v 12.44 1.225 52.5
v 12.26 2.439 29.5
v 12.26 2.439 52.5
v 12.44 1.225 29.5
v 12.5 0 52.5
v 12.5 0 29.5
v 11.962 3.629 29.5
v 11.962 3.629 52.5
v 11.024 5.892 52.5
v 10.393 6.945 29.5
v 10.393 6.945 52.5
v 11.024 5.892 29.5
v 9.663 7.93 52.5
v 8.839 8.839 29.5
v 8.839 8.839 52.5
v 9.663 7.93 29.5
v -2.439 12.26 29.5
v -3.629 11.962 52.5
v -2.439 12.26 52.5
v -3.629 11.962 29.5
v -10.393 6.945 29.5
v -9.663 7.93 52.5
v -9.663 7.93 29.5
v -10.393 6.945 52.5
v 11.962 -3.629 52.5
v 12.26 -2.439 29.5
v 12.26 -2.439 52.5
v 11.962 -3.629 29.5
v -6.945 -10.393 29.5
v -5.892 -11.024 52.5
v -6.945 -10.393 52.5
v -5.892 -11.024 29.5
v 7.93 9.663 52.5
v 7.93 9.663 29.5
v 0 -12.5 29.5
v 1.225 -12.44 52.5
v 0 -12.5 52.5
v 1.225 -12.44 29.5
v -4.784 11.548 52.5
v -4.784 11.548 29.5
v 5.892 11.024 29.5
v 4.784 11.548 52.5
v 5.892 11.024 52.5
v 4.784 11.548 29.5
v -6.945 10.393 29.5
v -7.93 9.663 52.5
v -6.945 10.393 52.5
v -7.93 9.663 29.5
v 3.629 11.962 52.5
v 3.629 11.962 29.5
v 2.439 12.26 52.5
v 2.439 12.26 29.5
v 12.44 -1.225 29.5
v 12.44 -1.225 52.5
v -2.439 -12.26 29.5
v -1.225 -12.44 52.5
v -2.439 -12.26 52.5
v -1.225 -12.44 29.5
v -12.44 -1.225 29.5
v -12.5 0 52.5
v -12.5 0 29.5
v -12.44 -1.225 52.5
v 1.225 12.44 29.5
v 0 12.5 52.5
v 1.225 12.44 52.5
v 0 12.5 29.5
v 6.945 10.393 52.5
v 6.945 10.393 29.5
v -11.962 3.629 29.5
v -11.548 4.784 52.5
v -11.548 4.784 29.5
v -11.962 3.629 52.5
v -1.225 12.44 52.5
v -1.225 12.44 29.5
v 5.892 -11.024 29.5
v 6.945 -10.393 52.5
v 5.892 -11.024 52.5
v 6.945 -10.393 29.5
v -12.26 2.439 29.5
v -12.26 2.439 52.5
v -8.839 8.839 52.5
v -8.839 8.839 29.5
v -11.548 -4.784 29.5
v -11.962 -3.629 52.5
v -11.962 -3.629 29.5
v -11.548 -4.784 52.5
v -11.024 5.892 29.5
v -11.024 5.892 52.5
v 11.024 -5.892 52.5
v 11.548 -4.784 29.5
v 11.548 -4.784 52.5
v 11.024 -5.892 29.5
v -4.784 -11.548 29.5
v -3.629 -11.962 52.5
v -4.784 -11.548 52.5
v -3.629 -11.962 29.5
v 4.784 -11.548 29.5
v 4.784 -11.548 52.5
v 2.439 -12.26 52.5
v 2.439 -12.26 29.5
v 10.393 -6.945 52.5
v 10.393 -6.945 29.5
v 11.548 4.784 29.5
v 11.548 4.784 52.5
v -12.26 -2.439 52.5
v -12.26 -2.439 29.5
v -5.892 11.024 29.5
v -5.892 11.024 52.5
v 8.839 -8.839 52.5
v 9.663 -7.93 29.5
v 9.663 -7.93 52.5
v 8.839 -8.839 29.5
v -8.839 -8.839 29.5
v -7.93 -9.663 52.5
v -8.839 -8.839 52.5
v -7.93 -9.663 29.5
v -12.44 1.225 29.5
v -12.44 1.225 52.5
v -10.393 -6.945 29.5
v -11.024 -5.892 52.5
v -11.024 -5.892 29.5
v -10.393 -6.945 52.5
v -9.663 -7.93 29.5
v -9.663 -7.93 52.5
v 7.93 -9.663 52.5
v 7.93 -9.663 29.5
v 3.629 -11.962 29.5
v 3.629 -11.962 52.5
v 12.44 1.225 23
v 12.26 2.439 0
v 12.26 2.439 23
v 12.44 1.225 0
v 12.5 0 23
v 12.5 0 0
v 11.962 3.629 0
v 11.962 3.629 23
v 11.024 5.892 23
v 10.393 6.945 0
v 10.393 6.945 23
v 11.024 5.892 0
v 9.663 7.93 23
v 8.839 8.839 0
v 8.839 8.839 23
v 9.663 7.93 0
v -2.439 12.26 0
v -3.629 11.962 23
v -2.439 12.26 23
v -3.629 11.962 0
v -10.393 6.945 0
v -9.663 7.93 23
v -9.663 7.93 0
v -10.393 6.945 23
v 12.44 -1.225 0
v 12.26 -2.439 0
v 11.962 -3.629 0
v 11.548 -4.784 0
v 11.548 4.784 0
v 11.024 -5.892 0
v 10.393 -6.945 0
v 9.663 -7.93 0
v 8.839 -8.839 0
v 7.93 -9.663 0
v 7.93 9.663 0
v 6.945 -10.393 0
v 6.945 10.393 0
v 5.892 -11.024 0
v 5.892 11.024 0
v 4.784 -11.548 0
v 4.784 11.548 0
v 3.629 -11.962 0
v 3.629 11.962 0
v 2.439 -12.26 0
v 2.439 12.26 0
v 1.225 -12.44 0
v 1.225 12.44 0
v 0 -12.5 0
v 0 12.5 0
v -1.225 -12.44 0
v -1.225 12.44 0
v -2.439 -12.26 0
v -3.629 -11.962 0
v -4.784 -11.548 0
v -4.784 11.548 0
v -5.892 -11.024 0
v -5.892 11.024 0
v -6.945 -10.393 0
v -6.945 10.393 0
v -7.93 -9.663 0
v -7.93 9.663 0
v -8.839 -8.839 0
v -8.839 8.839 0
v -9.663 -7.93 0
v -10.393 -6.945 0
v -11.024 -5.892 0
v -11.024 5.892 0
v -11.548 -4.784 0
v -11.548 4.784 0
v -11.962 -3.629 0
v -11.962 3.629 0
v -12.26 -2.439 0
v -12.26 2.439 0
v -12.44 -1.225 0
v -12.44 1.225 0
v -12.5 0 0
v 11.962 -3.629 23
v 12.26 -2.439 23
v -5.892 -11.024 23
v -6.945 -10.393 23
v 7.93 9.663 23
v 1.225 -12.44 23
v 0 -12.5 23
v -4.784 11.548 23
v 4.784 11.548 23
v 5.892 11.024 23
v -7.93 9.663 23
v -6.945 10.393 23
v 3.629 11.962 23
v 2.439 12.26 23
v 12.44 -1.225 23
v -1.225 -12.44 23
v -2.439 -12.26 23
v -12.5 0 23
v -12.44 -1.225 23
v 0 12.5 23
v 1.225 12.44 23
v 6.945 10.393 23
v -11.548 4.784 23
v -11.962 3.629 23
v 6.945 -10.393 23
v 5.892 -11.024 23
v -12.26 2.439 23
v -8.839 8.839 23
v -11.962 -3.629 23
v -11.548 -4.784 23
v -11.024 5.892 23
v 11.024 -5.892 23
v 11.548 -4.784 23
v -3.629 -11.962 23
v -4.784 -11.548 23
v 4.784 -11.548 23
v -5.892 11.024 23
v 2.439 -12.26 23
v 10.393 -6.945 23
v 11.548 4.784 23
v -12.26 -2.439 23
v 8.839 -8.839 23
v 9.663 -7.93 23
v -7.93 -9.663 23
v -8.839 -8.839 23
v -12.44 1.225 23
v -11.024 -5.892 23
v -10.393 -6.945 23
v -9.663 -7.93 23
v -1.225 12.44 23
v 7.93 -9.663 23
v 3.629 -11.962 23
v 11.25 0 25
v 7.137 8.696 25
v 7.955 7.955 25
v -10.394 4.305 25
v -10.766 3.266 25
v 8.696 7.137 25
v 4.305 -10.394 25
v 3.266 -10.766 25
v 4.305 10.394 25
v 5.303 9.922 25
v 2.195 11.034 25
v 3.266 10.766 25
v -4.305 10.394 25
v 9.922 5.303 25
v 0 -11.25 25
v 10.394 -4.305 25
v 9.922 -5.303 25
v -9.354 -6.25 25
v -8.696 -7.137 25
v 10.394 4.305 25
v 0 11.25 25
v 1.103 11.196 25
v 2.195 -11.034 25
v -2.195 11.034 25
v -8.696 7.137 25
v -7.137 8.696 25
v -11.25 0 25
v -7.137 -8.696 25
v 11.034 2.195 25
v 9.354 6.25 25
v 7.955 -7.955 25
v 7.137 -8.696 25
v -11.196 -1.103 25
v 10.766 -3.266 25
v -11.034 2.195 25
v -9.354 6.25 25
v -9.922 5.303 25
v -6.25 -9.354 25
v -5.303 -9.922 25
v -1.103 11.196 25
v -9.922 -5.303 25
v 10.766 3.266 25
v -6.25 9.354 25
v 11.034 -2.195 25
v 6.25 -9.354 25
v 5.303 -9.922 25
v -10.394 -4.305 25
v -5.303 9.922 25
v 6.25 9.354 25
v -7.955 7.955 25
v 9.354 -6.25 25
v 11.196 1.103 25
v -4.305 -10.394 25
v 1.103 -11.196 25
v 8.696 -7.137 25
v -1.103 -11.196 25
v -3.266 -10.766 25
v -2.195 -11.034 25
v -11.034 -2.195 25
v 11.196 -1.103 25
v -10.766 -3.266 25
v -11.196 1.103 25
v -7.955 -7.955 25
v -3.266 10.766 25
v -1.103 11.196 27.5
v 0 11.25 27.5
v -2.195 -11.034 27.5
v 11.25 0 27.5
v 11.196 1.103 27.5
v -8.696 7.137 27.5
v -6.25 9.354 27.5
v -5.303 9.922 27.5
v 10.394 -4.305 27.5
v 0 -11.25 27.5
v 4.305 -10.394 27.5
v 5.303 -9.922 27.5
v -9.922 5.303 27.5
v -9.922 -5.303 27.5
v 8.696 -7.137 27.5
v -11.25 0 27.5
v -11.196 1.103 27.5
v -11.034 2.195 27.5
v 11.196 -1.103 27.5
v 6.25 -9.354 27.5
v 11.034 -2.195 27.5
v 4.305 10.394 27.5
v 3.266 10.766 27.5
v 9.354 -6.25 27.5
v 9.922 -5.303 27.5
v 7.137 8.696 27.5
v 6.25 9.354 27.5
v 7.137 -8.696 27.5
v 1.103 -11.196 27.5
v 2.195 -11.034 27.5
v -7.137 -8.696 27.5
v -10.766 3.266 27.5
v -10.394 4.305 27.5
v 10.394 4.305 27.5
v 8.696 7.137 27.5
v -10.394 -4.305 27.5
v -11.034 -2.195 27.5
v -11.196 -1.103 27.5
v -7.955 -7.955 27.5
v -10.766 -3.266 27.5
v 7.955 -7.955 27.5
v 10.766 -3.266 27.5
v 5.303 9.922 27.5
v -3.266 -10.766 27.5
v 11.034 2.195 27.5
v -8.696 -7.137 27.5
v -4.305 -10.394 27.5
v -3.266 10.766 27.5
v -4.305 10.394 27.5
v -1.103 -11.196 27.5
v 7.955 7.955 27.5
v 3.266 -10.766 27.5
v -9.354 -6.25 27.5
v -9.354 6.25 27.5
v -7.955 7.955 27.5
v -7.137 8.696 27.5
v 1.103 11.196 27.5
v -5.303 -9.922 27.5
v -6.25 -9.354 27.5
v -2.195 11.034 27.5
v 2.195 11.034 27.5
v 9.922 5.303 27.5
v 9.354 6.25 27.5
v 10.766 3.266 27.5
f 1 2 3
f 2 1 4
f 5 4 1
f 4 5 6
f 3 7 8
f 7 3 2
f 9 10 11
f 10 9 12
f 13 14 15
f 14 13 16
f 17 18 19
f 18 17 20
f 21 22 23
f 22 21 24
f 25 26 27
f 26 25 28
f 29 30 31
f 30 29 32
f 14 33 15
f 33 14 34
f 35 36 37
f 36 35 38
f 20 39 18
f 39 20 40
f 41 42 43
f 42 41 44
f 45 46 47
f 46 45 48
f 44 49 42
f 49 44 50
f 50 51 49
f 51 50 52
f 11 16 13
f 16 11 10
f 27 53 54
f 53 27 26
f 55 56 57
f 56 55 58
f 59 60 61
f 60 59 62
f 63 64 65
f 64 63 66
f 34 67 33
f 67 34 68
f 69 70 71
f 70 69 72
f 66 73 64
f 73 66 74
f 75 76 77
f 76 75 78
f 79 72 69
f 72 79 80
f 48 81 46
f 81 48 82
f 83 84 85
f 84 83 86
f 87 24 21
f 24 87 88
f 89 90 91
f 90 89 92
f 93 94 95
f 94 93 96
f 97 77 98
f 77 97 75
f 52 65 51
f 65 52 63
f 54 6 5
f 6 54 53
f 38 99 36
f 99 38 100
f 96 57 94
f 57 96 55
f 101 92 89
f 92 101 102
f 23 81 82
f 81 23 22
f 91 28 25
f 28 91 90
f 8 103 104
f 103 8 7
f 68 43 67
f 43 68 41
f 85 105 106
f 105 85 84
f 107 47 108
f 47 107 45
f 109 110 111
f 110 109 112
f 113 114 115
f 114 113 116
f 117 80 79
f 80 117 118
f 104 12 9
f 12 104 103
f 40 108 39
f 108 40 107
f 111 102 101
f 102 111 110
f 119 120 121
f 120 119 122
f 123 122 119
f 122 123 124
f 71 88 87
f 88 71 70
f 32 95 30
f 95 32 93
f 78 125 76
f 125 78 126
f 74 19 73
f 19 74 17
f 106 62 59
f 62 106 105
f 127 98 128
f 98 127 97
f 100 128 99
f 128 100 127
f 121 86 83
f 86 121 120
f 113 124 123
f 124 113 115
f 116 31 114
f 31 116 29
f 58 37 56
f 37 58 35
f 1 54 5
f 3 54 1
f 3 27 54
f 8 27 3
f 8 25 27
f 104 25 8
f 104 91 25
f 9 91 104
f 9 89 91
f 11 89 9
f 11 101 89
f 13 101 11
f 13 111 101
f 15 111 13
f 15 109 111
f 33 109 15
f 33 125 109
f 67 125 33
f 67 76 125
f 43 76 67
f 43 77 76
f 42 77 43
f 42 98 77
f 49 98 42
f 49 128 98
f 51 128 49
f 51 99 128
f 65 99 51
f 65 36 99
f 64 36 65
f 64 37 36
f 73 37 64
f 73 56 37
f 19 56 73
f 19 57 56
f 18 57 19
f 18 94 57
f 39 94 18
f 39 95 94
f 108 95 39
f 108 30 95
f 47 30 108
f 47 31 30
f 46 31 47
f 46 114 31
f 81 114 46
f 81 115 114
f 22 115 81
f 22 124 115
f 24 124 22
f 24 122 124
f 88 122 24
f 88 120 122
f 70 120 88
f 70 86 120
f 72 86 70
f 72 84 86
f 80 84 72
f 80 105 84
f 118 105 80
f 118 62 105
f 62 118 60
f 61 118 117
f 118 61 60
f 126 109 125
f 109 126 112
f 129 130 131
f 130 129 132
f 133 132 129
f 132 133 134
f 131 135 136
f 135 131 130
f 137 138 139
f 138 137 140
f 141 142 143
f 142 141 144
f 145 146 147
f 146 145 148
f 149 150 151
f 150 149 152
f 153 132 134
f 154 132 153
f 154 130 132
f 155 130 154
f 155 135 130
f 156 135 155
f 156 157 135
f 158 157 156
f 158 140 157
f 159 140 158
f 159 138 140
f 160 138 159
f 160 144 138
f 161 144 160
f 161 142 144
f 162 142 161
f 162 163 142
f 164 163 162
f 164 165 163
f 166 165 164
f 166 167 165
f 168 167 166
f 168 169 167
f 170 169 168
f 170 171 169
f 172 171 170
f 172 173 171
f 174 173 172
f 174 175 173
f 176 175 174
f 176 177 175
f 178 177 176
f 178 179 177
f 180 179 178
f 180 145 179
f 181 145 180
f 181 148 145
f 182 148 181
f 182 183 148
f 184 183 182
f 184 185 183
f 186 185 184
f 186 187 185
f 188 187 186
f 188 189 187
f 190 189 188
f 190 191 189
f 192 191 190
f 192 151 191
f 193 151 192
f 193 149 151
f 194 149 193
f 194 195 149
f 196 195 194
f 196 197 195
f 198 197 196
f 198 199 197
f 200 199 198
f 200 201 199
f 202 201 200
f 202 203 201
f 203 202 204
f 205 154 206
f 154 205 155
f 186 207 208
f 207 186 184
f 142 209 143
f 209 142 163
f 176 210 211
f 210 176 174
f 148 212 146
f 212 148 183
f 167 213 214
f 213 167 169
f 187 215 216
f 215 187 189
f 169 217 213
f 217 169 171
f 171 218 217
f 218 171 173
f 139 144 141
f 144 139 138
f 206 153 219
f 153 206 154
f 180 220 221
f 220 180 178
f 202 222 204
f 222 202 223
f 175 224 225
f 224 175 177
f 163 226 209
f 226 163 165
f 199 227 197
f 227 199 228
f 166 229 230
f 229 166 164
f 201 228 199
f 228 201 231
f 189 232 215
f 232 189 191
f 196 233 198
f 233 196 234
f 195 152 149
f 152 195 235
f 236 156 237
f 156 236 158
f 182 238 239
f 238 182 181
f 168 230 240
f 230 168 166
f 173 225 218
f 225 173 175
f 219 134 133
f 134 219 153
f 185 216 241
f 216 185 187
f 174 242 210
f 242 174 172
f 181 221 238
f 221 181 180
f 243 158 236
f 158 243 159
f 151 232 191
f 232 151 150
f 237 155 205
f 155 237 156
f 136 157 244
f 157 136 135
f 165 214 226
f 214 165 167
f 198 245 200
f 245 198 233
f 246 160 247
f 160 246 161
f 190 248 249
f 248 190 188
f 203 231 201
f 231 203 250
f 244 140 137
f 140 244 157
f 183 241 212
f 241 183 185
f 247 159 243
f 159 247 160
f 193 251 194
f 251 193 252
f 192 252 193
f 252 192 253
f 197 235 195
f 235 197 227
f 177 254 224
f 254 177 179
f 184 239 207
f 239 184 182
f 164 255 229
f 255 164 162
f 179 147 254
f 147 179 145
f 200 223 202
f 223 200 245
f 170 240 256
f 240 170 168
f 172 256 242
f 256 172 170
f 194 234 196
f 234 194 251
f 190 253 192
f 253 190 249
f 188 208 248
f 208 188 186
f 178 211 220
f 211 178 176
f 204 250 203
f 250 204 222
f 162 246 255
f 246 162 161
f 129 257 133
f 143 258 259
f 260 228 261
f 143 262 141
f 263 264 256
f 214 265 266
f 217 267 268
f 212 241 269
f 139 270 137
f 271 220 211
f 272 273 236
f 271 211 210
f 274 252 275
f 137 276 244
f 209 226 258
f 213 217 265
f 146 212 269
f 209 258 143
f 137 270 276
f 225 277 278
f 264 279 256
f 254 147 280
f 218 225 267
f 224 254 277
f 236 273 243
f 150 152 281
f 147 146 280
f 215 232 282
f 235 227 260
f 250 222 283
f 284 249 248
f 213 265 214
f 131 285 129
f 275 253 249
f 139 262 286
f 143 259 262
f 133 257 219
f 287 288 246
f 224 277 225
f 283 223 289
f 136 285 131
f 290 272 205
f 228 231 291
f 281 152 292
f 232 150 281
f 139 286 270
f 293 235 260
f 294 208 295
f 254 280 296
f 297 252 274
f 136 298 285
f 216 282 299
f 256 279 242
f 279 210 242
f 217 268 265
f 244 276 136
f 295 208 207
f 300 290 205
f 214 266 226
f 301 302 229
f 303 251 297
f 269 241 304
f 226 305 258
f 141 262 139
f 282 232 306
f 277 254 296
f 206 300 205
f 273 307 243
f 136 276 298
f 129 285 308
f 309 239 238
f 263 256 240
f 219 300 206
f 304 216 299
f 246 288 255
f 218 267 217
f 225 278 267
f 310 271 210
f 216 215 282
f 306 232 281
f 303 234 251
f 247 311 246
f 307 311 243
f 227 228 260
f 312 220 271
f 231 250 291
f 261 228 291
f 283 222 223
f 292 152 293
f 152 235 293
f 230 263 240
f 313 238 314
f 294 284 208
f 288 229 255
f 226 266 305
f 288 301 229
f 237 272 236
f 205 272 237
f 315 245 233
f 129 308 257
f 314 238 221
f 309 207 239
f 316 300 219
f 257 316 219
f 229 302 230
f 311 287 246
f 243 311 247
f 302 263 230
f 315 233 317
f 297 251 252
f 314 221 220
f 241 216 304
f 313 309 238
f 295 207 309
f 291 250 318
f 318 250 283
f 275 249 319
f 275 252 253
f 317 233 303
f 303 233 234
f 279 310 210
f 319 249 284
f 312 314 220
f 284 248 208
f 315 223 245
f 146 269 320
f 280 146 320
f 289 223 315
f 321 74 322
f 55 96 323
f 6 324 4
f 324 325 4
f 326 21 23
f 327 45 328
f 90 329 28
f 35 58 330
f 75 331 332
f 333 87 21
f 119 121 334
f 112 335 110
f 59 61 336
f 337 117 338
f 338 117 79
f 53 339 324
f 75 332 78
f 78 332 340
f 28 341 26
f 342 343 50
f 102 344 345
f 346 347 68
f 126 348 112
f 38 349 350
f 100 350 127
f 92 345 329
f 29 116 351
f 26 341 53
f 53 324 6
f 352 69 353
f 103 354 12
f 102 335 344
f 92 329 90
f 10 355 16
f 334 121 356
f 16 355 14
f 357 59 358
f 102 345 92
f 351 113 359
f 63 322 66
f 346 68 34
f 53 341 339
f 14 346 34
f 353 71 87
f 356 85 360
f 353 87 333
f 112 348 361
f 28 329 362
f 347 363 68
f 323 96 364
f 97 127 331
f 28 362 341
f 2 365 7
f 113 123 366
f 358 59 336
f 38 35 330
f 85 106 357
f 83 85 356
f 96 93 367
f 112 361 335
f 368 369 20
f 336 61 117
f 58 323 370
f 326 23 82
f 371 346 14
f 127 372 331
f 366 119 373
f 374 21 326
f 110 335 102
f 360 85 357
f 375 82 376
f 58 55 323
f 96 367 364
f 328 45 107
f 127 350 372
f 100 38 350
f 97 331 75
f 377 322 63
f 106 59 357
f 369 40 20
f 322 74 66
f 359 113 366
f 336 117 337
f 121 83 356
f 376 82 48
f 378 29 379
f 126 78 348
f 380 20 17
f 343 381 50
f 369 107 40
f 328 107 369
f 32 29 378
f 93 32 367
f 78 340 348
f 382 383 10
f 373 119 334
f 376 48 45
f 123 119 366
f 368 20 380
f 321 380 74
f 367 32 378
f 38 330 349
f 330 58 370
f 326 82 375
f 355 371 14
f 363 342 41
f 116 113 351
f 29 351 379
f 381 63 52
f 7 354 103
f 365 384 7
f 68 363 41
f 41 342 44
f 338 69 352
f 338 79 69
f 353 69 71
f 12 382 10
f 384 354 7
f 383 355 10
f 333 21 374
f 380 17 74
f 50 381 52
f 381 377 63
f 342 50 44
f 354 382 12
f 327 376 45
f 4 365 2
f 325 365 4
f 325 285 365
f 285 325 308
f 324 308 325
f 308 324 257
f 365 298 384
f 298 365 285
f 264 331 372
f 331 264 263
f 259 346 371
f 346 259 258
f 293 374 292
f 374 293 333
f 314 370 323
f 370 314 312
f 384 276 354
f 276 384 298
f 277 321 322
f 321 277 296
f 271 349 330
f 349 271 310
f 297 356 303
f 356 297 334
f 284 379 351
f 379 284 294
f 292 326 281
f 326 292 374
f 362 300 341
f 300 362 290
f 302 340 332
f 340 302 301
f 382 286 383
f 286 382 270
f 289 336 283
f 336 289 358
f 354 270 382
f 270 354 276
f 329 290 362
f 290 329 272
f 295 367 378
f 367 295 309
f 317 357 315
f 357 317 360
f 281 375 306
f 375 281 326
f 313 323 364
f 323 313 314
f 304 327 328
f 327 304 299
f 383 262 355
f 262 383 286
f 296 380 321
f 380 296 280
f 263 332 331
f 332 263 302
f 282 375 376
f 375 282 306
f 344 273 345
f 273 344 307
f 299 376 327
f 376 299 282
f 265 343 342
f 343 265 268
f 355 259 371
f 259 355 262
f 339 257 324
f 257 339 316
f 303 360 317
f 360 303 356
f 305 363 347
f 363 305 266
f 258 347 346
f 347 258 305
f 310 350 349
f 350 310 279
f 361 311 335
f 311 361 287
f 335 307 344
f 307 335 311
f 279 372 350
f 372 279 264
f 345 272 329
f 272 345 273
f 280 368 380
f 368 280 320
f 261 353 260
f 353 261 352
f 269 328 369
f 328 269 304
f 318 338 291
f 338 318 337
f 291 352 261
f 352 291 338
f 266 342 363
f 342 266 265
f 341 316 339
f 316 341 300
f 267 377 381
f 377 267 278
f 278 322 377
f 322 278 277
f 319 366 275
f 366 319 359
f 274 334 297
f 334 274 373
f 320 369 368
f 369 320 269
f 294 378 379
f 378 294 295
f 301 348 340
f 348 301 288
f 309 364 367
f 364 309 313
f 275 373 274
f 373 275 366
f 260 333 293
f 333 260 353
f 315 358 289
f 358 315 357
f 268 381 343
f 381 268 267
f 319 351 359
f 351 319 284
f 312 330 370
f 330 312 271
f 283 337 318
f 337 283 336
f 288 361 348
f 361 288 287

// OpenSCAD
$fn=64;
union(){union(){translate(v = [0, 0, 29.500])
cylinder(h = 23, r = 12.500);
cylinder(h = 23, r = 12.500);
translate(v = [0, 0, 23])
cylinder(h = 2, r1 = 12.500, r2 = 11.250);
translate(v = [0, 0, 27.500])
cylinder(h = 2, r1 = 11.250, r2 = 12.500);
translate(v = [0, 0, 25])
cylinder(h = 2.500, r = 11.250);
}
}
